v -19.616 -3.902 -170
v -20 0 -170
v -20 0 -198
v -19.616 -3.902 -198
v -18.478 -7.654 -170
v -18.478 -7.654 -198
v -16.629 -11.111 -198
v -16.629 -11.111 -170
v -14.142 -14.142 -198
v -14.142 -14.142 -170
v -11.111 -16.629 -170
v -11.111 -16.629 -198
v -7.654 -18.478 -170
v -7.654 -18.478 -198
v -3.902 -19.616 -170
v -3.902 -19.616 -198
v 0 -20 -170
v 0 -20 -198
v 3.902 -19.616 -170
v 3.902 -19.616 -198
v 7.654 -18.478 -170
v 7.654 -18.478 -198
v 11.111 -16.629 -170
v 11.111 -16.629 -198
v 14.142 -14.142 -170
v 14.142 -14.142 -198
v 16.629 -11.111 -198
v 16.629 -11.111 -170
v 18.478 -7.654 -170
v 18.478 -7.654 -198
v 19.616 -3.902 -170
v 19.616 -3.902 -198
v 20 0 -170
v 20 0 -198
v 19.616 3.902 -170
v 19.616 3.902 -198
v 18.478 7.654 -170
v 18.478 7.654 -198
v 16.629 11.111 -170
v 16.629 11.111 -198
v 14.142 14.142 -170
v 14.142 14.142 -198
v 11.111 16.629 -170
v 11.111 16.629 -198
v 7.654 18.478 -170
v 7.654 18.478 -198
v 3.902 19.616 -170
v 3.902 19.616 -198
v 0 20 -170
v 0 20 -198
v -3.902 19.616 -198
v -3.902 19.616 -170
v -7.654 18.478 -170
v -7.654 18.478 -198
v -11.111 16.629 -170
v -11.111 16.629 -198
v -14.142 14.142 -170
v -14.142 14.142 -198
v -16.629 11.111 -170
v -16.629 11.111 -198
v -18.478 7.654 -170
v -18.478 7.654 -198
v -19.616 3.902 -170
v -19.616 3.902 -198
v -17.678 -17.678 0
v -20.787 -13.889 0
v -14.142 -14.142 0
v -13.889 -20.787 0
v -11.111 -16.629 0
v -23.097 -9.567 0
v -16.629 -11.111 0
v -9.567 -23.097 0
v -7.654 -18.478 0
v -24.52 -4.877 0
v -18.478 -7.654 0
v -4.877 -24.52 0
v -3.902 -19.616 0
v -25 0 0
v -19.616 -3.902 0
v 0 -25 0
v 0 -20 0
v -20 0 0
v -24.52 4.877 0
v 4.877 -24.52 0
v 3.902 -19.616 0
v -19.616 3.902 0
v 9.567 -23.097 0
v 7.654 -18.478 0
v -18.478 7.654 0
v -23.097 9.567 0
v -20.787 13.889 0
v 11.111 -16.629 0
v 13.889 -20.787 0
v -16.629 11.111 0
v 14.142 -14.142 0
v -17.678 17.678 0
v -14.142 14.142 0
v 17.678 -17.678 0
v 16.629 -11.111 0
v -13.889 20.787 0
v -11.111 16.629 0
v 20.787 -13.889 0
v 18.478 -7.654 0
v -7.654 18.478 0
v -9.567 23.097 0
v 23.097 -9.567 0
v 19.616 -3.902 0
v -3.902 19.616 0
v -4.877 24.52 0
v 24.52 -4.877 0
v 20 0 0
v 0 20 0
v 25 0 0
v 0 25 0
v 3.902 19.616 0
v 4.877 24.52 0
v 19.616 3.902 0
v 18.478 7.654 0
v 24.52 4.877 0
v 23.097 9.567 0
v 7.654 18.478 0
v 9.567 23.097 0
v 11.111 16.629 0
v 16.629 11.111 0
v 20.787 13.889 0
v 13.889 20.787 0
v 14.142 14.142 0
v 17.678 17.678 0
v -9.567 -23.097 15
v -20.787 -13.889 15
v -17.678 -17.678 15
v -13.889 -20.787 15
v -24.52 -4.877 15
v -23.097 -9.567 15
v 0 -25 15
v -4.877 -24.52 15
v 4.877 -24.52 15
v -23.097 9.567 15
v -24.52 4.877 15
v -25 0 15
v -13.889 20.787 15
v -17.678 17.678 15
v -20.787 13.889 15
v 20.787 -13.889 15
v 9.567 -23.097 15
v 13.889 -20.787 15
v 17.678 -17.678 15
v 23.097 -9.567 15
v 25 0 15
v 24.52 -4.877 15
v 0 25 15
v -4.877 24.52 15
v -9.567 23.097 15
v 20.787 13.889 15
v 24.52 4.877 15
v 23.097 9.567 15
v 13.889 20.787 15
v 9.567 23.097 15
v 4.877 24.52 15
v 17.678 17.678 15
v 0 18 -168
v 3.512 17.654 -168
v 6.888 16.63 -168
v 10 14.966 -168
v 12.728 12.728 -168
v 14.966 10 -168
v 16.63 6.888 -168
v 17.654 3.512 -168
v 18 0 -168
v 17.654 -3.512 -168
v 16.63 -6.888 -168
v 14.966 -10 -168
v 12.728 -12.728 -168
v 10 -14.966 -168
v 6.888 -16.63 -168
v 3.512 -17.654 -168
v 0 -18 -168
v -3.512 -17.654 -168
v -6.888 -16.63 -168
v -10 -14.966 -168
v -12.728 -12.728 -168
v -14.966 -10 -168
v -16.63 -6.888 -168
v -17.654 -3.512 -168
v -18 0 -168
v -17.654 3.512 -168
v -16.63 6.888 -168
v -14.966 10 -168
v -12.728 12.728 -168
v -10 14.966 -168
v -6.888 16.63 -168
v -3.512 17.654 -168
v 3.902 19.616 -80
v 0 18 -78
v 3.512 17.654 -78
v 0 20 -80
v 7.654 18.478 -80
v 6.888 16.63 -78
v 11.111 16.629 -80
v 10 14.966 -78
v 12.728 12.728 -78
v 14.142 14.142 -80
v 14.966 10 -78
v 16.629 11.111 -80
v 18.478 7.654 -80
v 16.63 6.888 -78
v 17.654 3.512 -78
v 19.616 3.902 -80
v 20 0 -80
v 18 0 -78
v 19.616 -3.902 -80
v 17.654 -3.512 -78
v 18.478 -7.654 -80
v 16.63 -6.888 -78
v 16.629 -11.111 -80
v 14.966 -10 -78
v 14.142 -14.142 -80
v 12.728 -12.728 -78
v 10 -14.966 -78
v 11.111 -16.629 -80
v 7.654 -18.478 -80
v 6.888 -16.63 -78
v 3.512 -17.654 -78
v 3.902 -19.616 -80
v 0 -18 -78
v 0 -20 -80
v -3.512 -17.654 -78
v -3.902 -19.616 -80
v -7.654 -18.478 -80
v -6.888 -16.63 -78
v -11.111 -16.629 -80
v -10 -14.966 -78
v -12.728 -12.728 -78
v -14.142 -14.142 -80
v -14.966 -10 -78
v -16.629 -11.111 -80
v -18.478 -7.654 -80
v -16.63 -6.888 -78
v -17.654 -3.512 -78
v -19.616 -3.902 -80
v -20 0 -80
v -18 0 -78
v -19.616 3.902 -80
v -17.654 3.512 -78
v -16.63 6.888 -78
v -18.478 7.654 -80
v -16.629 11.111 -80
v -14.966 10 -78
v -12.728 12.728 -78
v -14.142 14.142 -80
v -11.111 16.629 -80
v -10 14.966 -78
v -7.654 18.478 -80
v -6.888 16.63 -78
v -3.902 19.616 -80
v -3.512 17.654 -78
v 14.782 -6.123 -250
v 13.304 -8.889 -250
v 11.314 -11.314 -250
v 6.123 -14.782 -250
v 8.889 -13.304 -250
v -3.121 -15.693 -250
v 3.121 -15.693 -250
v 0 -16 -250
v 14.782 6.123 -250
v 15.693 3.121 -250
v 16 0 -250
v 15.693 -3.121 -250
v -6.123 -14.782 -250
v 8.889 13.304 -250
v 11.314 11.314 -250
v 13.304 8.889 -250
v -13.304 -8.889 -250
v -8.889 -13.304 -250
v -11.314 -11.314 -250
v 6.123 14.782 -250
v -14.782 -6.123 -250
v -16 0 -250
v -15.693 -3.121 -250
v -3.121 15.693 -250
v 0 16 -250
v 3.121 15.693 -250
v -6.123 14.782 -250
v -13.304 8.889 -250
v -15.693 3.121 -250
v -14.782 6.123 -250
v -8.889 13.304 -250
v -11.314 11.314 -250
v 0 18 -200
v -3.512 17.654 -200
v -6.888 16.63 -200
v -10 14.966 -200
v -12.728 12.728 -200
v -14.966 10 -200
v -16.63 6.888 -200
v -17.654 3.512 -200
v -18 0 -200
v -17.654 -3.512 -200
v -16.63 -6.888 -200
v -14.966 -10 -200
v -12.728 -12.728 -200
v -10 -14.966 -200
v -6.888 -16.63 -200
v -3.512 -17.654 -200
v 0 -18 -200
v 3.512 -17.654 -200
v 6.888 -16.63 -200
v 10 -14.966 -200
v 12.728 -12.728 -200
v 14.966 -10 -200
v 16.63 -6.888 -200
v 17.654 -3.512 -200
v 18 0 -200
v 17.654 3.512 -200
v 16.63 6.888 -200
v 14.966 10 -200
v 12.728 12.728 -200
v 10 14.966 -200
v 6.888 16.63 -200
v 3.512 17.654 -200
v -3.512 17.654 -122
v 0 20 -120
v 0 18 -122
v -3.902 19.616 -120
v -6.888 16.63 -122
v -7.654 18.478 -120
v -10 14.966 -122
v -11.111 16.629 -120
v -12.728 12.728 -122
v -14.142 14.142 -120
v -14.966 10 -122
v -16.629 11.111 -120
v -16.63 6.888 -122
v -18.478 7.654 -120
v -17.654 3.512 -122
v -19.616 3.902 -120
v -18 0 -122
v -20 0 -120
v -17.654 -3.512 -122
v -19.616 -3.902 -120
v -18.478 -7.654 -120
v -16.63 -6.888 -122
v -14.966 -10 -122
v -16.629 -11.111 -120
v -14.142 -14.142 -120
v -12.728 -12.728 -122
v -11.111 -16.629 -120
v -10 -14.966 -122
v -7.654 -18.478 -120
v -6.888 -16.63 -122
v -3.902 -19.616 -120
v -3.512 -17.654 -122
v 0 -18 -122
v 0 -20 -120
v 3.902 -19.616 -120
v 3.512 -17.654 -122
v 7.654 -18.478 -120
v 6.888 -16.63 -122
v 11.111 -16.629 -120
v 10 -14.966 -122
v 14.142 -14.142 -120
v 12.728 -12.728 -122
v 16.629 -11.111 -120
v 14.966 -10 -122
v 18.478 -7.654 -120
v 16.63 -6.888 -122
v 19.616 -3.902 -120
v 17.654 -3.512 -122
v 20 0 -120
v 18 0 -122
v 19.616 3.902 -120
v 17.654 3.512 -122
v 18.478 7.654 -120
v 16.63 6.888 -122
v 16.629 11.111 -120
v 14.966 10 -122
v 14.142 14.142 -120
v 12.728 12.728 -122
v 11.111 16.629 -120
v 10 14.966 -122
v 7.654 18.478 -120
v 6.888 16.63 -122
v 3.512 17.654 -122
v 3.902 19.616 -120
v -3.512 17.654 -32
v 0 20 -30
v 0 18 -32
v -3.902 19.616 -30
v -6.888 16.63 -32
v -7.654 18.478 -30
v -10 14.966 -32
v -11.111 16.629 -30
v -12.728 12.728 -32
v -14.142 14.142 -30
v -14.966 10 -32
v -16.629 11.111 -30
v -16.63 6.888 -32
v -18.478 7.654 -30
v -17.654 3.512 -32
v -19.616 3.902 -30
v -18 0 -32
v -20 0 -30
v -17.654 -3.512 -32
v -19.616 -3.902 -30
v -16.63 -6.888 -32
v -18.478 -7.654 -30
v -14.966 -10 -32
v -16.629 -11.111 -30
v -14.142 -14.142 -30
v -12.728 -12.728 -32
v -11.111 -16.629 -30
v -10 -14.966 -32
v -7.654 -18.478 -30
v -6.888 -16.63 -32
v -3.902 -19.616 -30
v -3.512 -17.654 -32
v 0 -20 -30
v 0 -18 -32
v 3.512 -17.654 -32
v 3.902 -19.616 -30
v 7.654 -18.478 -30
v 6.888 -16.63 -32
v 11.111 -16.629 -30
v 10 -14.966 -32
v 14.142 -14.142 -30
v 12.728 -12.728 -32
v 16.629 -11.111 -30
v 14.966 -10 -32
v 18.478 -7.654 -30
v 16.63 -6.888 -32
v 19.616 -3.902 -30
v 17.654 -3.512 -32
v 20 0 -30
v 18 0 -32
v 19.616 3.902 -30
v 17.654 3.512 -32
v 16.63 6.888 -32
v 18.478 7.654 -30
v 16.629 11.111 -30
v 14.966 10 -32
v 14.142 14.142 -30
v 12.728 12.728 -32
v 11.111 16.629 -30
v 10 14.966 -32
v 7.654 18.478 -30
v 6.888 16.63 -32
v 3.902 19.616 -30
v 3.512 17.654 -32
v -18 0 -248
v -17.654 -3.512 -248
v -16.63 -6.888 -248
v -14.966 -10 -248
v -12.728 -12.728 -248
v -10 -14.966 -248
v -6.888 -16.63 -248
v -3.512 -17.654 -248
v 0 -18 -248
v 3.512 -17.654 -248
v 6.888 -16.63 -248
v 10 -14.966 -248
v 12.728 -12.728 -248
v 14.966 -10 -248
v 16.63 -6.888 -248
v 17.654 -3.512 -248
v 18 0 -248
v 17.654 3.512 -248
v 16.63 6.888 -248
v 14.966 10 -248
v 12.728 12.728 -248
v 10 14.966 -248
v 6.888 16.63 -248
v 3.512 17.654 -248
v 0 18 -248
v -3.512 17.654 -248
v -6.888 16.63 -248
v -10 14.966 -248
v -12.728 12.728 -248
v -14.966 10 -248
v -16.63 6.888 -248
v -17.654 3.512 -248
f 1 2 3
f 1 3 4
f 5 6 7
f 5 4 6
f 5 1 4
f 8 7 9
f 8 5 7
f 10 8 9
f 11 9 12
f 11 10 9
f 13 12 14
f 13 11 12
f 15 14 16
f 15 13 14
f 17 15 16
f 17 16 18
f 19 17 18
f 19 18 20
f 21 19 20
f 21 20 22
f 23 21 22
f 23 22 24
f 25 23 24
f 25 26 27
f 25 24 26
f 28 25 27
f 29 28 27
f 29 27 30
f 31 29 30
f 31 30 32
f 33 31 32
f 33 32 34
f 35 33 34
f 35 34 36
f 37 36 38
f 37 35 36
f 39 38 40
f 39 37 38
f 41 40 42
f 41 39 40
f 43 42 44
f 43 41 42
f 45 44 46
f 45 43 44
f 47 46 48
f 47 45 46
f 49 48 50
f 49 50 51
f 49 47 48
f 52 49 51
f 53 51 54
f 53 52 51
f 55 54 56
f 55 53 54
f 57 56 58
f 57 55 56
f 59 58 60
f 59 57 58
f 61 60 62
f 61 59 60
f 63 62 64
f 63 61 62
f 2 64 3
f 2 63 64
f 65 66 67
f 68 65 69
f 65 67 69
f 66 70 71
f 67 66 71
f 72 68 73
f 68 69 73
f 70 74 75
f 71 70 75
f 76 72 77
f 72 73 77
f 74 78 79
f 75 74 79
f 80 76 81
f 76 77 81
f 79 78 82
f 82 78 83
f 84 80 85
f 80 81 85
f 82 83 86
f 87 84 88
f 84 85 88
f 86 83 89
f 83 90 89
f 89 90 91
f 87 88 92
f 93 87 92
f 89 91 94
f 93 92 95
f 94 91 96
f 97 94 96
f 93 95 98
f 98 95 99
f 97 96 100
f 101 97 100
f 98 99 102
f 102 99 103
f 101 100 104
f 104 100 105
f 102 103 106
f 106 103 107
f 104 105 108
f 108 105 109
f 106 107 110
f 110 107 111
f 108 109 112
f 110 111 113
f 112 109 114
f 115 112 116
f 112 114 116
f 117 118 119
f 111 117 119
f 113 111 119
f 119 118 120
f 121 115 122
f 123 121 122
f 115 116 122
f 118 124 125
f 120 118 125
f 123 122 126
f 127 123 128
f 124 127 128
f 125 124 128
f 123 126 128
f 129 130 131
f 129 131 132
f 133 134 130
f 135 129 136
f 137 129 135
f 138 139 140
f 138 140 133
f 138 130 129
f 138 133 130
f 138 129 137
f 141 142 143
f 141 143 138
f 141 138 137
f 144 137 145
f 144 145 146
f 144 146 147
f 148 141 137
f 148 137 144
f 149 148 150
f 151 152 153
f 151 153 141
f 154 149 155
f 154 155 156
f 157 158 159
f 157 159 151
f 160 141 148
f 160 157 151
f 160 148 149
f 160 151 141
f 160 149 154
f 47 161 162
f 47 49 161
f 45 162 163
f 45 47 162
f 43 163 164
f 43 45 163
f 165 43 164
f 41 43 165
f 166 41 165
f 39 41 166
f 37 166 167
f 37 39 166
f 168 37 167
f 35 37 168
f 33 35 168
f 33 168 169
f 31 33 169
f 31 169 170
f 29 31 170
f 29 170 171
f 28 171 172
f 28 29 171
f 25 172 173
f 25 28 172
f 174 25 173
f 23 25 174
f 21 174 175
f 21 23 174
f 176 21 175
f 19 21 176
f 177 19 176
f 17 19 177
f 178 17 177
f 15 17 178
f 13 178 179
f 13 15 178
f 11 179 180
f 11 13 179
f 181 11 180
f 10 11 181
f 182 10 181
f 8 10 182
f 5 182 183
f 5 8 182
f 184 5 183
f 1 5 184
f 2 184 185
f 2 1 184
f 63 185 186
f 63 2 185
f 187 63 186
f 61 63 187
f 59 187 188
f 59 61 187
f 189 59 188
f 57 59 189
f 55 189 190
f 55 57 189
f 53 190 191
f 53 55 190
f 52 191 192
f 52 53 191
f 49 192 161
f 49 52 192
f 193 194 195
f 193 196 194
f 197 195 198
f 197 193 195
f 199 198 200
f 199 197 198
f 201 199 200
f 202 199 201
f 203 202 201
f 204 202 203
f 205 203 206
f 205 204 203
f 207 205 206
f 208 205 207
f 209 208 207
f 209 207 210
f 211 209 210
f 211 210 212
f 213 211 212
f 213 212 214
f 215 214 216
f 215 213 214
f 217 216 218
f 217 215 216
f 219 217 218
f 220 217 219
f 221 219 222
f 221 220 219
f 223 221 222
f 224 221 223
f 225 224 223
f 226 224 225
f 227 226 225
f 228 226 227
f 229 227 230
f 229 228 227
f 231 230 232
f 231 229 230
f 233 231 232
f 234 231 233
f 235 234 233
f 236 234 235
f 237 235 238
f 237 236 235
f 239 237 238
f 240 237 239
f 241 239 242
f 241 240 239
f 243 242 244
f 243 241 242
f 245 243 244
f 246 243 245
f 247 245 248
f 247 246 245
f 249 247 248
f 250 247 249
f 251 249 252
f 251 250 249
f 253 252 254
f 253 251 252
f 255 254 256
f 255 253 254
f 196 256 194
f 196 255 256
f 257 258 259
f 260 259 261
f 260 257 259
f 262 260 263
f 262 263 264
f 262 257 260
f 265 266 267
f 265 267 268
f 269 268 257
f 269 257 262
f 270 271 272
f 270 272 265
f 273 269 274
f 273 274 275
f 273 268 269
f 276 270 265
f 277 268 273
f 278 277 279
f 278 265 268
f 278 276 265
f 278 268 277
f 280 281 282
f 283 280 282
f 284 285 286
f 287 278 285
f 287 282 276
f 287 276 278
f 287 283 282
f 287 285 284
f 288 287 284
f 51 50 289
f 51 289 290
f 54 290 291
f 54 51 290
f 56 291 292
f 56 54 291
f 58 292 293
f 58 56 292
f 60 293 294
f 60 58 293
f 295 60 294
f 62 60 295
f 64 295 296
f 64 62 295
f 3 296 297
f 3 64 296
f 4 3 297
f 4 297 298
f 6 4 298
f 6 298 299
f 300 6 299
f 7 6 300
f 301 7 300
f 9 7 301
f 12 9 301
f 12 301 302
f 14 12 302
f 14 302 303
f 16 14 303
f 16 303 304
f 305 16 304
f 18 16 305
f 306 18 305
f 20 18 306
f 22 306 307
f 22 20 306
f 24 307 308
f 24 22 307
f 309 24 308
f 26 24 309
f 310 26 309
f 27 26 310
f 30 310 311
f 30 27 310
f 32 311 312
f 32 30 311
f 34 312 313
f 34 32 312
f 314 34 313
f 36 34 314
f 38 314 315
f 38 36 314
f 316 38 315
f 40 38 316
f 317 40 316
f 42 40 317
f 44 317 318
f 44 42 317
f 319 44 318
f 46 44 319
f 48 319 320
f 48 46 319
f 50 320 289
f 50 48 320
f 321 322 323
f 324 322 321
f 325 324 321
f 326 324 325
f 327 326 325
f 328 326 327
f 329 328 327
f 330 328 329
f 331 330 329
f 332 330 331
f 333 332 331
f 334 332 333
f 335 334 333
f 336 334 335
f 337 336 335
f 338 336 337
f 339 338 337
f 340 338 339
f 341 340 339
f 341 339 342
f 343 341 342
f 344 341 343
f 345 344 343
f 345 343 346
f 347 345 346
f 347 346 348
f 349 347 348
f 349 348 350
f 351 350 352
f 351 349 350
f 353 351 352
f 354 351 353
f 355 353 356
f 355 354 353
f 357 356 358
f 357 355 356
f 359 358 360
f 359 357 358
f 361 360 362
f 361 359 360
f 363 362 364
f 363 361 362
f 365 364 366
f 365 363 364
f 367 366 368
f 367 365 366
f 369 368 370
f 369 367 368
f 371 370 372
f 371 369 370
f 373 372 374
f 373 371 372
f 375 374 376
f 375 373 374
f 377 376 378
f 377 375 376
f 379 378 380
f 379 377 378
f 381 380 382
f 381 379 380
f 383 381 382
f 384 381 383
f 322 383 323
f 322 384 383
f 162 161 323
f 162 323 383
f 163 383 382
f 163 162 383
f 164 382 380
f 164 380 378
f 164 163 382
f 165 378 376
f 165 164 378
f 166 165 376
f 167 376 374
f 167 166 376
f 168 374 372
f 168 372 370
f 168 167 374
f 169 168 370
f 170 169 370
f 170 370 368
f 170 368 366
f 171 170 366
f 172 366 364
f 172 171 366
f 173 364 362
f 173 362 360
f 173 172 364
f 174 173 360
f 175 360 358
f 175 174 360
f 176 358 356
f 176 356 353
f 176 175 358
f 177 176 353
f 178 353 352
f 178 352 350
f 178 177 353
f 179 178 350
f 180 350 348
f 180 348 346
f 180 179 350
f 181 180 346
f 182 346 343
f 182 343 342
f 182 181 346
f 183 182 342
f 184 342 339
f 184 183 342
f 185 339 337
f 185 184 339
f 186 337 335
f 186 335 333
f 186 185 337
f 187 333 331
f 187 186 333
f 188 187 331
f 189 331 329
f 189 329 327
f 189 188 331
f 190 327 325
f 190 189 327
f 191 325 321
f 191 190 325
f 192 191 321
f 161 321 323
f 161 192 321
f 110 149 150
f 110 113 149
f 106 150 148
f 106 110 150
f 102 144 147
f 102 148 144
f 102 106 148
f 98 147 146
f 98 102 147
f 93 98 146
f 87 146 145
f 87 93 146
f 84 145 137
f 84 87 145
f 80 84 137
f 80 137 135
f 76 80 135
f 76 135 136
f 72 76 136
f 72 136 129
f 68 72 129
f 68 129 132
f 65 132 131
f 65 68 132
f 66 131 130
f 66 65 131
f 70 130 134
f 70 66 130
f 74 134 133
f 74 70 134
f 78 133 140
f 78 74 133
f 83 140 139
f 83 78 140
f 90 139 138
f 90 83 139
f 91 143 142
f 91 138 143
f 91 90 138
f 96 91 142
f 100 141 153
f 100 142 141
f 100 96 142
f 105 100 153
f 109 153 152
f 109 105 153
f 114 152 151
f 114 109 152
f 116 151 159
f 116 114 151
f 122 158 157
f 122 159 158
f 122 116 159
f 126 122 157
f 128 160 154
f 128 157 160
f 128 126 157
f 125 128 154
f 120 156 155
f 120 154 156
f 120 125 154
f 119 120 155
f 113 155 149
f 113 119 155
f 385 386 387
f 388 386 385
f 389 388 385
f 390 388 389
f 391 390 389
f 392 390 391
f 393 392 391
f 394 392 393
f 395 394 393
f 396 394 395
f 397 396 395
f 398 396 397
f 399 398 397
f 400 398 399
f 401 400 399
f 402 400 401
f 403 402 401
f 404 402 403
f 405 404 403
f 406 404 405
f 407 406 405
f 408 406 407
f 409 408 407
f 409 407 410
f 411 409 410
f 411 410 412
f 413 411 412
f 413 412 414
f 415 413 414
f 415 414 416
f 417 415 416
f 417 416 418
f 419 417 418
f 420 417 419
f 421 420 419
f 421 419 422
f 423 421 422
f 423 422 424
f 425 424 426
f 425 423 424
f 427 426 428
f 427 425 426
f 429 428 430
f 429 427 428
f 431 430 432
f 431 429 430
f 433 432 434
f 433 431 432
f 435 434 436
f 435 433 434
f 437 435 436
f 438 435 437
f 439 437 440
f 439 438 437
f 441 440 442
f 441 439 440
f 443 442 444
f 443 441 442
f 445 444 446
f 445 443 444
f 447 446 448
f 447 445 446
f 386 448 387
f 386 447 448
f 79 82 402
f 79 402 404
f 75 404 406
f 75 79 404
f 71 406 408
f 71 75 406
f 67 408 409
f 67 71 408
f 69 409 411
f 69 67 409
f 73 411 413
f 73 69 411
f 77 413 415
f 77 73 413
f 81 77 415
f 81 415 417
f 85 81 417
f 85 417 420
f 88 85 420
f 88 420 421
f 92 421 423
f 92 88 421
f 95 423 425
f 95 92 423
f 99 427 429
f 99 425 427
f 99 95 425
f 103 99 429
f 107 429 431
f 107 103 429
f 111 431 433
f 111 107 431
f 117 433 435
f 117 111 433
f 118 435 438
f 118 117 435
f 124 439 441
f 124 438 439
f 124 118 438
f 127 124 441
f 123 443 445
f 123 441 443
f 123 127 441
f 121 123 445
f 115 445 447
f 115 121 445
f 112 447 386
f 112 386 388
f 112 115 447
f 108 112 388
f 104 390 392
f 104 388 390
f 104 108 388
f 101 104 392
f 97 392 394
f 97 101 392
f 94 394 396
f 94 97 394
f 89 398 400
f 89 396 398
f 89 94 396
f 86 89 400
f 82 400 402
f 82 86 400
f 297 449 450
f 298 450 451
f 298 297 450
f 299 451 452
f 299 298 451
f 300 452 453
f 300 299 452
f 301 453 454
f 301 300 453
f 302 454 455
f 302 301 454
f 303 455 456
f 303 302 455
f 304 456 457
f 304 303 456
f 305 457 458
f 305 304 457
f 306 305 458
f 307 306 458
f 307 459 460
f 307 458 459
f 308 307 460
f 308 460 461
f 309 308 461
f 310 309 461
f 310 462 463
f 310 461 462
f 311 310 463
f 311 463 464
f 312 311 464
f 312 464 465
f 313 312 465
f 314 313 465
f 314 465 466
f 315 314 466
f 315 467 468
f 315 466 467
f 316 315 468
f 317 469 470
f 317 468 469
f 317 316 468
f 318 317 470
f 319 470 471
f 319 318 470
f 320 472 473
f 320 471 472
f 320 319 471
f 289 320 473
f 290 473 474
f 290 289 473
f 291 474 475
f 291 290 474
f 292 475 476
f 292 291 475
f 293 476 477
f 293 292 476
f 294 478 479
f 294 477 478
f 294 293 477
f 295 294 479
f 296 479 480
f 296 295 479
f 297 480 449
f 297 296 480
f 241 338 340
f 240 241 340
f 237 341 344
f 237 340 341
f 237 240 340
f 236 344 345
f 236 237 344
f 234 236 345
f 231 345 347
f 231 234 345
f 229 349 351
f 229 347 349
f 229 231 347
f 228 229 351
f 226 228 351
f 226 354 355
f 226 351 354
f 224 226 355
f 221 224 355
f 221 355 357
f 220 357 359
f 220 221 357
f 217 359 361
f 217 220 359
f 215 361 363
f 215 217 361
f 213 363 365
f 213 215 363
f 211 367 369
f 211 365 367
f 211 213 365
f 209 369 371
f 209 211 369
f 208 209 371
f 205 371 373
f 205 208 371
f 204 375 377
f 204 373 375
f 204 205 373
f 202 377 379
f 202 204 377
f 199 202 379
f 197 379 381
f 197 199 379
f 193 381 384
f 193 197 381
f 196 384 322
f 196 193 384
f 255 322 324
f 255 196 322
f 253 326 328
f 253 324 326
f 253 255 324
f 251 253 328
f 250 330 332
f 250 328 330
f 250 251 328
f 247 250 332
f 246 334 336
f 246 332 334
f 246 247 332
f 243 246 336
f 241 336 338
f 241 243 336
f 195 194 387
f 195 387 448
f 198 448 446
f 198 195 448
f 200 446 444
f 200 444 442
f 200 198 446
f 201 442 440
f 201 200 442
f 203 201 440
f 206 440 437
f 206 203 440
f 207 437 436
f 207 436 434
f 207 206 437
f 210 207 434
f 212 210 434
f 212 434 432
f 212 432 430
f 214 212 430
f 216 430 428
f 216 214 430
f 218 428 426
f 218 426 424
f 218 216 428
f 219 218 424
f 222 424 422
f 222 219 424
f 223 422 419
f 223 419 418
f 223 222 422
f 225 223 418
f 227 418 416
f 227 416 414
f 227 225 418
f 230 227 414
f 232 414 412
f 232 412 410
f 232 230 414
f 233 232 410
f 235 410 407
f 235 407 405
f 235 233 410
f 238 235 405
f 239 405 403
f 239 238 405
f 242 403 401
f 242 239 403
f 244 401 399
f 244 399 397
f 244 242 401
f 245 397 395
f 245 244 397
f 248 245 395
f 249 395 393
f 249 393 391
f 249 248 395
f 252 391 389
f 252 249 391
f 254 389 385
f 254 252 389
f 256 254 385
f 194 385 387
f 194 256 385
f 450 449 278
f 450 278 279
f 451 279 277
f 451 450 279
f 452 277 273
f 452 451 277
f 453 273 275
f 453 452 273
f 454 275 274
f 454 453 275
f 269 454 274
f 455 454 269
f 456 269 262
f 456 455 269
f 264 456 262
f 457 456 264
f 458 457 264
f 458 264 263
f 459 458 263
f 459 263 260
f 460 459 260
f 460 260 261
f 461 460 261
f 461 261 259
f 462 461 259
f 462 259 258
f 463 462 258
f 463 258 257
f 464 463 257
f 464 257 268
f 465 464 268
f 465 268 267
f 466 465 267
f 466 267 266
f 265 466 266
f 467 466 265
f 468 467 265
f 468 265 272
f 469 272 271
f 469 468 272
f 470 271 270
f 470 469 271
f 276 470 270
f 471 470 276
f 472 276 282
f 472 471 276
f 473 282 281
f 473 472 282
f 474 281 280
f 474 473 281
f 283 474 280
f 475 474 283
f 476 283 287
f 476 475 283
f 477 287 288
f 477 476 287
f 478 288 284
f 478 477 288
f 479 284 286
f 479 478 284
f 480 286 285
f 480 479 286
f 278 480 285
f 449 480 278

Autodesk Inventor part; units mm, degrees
ref_plane "YZ Plane" through (0, 0, 0) normal (1, 0, 0) x (0, 1, 0)
ref_plane "XZ Plane" through (0, 0, 0) normal (0, 1, 0) x (-1, 0, 0)
ref_plane "XY Plane" through (0, 0, 0) normal (0, 0, 1) x (1, 0, 0)
sketch "Эскиз1" plane through (0, 0, 0) normal (0, 0, 1) x (1, 0, 0)
  circle A0 centre (0, 0) radius 25
  dimension "d0" = 50
extrude "Выдавливание1" add sketch "Эскиз1" along normal blind 15
sketch "Эскиз2" plane through (0, 0, 0) normal (0, 0, -1) x (-1, 0, 0)
  circle A0 centre (0, 0) radius 25 projected
  circle A1 centre (0, 0) radius 20
  dimension "d3" = 40
extrude "Выдавливание2" add sketch "Эскиз2" along normal blind 200 contours A1
sketch "Эскиз3" plane through (0, 0, 0) normal (1, 0, 0) x (0, 1, 0)
  line L0 (-20, -200) -> (20, -200) projected
  line L1 (20, 0) -> (-20, 0) projected
  line L2 (20, 0) -> (20, -200) projected
  line L3 (-20, 0) -> (-20, -200) projected
  line L4 (20, 0) -> (20, -30)
  line L5 (20, -30) -> (20, -30)
  line L6 (18, -32) -> (18, -78)
  line L7 (20, -80) -> (20, -80)
  line L8 (20, -80) -> (20, -120)
  line L9 (20, -120) -> (20, -120)
  line L10 (18, -122) -> (18, -168)
  line L11 (20, -170) -> (20, -170)
  line L12 (20, -30) -> (18, -32)
  line L13 (18, -78) -> (20, -80)
  line L14 (20, -120) -> (18, -122)
  line L15 (18, -168) -> (20, -170)
  line L16 (0, 0) -> (0, -14)
  line L17 (20, -200) -> (18, -200)
  line L18 (-20, -200) -> (20, -200) projected
  line L19 (18, -200) -> (20, -198)
  line L20 (20, 0) -> (20, -200) projected
  point P0 (18, -30)
  point P1 (18, -80)
  point P2 (18, -120)
  point P3 (18, -170)
  dimension "d6" = 30
  dimension "d7" = 2
  dimension "d8" = 50
  dimension "d9" = 40
  dimension "d10" = 50
  dimension "d11" = 2
  dimension "d12" = 2
  dimension "d13" = 2
  dimension "d14" = 2
  dimension "d15" = 2
  dimension "d16" = 2
  dimension "d17" = 2
  dimension "d18" = 2
  dimension "d27" = 2
revolve "Вращение1" cut sketch "Эскиз3" angle 360 about axis through (0, 0, 0) along (0, 0, -1) contours L19 L2 L0 | L15 L10 L14 L2 | L2 L13 L6 L12
sketch "Эскиз5" plane through (0, 0, -200) normal (0, 0, -1) x (-1, 0, 0)
  circle A0 centre (0, 0) radius 18 projected
extrude "Выдавливание4" add sketch "Эскиз5" along normal blind 50
thread "Резьба2" size "M36x4" class "6g" standard "ANSI Metric M Profile" full length
chamfer "Фаска2" distance 2 angle 45 1 edges at (18, 0, -250)
equation "\"d12\" = d11"
equation "\"d13\" = d11"
equation "\"d14\" = d13"
equation "\"d15\" = d11"
equation "\"d16\" = d15"
equation "\"d17\" = d11"
equation "\"d18\" = d17"
properties part number "Болт шатуна" material "Сталь, высокопрочная, низколегированная"
